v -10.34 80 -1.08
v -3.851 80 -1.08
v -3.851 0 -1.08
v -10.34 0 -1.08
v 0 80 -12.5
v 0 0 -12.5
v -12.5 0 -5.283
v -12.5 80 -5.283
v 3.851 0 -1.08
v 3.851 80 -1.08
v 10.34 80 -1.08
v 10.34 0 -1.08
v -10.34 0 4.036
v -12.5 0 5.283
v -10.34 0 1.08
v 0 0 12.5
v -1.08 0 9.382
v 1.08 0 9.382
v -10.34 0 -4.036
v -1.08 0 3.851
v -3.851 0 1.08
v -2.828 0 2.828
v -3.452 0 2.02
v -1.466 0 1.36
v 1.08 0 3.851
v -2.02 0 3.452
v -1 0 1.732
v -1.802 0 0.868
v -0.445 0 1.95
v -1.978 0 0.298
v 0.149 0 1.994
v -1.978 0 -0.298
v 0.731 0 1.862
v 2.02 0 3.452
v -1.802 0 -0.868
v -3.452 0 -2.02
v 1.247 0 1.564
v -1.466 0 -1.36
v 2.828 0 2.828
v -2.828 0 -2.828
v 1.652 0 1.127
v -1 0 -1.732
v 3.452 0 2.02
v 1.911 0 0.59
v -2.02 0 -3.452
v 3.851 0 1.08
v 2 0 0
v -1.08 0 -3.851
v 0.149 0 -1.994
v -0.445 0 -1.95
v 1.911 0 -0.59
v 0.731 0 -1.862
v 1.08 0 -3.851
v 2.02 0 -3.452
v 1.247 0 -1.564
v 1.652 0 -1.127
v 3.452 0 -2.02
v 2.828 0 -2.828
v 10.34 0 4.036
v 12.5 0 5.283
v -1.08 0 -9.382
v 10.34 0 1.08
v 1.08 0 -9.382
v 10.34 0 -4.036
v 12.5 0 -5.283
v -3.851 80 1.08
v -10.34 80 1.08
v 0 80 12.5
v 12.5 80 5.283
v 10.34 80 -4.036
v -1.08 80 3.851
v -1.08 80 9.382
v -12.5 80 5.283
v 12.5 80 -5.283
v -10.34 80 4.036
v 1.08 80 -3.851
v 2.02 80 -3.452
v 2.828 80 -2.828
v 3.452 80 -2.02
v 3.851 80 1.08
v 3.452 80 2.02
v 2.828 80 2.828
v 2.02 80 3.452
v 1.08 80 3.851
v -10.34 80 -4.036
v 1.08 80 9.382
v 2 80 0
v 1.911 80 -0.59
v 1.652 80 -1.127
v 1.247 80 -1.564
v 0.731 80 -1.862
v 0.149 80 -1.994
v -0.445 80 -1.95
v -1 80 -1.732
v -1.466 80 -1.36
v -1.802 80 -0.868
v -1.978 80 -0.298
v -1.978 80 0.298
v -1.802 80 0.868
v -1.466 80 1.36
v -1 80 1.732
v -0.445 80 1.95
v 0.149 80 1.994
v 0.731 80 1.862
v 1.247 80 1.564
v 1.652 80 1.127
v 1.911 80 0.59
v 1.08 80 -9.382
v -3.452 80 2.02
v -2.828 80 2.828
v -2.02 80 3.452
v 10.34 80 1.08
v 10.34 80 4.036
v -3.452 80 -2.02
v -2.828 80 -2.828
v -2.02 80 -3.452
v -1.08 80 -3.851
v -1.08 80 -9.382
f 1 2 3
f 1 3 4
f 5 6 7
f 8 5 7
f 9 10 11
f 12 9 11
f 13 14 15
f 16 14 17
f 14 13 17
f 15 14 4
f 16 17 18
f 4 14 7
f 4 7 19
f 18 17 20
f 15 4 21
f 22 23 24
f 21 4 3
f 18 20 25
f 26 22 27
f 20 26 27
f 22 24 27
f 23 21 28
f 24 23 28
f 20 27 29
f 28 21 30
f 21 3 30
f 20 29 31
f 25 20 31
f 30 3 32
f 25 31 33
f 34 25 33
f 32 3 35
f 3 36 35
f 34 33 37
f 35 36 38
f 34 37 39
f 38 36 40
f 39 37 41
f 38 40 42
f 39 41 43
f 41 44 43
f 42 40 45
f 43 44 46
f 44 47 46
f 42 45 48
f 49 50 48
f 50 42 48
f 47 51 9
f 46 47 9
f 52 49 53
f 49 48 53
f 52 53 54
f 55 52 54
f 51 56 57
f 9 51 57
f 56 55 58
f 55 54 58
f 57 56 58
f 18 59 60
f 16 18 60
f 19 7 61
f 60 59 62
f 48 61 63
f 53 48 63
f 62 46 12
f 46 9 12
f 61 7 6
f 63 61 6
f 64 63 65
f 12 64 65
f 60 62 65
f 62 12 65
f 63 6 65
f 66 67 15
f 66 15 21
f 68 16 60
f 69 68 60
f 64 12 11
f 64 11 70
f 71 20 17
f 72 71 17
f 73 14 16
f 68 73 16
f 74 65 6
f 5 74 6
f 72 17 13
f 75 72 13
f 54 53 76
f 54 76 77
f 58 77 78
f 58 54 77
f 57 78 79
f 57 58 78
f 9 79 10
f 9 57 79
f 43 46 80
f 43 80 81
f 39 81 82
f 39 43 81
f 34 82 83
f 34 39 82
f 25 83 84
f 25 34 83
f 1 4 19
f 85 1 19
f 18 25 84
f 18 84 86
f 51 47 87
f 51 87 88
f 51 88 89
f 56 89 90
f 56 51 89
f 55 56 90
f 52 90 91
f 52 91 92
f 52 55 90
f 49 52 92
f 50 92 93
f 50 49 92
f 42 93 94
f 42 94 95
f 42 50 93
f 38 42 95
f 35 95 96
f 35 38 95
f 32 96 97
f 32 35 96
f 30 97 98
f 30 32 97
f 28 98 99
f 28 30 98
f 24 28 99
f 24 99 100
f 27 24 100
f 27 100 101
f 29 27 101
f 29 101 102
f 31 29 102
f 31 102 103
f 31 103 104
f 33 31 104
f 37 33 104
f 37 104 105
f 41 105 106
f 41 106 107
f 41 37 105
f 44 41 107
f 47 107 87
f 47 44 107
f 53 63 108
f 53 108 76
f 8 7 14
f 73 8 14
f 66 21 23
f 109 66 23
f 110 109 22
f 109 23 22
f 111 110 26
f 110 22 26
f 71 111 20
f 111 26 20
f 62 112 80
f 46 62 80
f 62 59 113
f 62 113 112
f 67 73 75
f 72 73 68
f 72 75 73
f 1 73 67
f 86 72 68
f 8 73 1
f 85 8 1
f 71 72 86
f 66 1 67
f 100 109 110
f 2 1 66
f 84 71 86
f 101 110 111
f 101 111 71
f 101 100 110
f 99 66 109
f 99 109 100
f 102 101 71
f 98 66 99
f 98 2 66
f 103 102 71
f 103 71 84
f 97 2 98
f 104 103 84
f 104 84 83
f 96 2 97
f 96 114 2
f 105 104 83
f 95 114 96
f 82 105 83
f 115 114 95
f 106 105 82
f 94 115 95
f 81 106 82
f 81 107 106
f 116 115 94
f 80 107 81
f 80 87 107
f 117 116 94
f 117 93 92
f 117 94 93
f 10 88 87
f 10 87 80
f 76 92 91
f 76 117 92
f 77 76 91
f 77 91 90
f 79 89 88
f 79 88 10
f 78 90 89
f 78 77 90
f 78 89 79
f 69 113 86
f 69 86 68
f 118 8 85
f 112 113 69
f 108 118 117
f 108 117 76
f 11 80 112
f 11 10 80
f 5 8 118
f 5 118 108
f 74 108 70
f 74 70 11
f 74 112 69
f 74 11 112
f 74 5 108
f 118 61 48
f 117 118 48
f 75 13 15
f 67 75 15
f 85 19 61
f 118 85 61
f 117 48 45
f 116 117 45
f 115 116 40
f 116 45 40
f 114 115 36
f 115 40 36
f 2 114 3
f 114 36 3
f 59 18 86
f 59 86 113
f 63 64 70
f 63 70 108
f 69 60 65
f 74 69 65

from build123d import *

# Parameters (mm, degrees)
SKETCH1_R           = 2
BOSS_EXTRUDE2_DEPTH = 80


with BuildPart() as part:
    # Sketch1 → Boss-Extrude2 (new body)
    with BuildSketch(Plane(origin=(0, 0, 0), x_dir=(1, 0, 0), z_dir=(0, 1, 0))):
        Polygon((-12.5, 5.283121635), (-12.5, -5.283121635), (0, -12.5), (12.5, -5.283121635), (12.5, 5.283121635), (0, 12.5), align=None)
        Circle(SKETCH1_R, mode=Mode.SUBTRACT)
        with BuildLine():
            Line((-1.08, 9.382308546), (-1.08, 3.851441289))
            ThreePointArc((-1.08, 3.851441289), (-2.828427125, 2.828427125), (-3.851441289, 1.08))
            Line((-3.851441289, 1.08), (-10.34, 1.08))
            Line((-10.34, 1.08), (-10.34, 4.036045054))
            Line((-10.34, 4.036045054), (-1.08, 9.382308546))
        make_face(mode=Mode.SUBTRACT)
        with BuildLine():
            Line((1.08, 9.382308546), (1.08, 3.851441289))
            ThreePointArc((1.08, 3.851441289), (2.828427125, 2.828427125), (3.851441289, 1.08))
            Line((3.851441289, 1.08), (10.34, 1.08))
            Line((10.34, 1.08), (10.34, 4.036045054))
            Line((10.34, 4.036045054), (1.08, 9.382308546))
        make_face(mode=Mode.SUBTRACT)
        with BuildLine():
            Line((-10.34, -1.08), (-3.851441289, -1.08))
            ThreePointArc((-3.851441289, -1.08), (-2.828427125, -2.828427125), (-1.08, -3.851441289))
            Line((-1.08, -3.851441289), (-1.08, -9.382308546))
            Line((-1.08, -9.382308546), (-10.34, -4.036045054))
            Line((-10.34, -4.036045054), (-10.34, -1.08))
        make_face(mode=Mode.SUBTRACT)
        with BuildLine():
            Line((1.08, -3.851441289), (1.08, -9.382308546))
            Line((1.08, -9.382308546), (10.34, -4.036045054))
            Line((10.34, -4.036045054), (10.34, -1.08))
            Line((10.34, -1.08), (3.851441289, -1.08))
            ThreePointArc((3.851441289, -1.08), (2.828427125, -2.828427125), (1.08, -3.851441289))
        make_face(mode=Mode.SUBTRACT)
    extrude(amount=BOSS_EXTRUDE2_DEPTH)


solid = part.part
